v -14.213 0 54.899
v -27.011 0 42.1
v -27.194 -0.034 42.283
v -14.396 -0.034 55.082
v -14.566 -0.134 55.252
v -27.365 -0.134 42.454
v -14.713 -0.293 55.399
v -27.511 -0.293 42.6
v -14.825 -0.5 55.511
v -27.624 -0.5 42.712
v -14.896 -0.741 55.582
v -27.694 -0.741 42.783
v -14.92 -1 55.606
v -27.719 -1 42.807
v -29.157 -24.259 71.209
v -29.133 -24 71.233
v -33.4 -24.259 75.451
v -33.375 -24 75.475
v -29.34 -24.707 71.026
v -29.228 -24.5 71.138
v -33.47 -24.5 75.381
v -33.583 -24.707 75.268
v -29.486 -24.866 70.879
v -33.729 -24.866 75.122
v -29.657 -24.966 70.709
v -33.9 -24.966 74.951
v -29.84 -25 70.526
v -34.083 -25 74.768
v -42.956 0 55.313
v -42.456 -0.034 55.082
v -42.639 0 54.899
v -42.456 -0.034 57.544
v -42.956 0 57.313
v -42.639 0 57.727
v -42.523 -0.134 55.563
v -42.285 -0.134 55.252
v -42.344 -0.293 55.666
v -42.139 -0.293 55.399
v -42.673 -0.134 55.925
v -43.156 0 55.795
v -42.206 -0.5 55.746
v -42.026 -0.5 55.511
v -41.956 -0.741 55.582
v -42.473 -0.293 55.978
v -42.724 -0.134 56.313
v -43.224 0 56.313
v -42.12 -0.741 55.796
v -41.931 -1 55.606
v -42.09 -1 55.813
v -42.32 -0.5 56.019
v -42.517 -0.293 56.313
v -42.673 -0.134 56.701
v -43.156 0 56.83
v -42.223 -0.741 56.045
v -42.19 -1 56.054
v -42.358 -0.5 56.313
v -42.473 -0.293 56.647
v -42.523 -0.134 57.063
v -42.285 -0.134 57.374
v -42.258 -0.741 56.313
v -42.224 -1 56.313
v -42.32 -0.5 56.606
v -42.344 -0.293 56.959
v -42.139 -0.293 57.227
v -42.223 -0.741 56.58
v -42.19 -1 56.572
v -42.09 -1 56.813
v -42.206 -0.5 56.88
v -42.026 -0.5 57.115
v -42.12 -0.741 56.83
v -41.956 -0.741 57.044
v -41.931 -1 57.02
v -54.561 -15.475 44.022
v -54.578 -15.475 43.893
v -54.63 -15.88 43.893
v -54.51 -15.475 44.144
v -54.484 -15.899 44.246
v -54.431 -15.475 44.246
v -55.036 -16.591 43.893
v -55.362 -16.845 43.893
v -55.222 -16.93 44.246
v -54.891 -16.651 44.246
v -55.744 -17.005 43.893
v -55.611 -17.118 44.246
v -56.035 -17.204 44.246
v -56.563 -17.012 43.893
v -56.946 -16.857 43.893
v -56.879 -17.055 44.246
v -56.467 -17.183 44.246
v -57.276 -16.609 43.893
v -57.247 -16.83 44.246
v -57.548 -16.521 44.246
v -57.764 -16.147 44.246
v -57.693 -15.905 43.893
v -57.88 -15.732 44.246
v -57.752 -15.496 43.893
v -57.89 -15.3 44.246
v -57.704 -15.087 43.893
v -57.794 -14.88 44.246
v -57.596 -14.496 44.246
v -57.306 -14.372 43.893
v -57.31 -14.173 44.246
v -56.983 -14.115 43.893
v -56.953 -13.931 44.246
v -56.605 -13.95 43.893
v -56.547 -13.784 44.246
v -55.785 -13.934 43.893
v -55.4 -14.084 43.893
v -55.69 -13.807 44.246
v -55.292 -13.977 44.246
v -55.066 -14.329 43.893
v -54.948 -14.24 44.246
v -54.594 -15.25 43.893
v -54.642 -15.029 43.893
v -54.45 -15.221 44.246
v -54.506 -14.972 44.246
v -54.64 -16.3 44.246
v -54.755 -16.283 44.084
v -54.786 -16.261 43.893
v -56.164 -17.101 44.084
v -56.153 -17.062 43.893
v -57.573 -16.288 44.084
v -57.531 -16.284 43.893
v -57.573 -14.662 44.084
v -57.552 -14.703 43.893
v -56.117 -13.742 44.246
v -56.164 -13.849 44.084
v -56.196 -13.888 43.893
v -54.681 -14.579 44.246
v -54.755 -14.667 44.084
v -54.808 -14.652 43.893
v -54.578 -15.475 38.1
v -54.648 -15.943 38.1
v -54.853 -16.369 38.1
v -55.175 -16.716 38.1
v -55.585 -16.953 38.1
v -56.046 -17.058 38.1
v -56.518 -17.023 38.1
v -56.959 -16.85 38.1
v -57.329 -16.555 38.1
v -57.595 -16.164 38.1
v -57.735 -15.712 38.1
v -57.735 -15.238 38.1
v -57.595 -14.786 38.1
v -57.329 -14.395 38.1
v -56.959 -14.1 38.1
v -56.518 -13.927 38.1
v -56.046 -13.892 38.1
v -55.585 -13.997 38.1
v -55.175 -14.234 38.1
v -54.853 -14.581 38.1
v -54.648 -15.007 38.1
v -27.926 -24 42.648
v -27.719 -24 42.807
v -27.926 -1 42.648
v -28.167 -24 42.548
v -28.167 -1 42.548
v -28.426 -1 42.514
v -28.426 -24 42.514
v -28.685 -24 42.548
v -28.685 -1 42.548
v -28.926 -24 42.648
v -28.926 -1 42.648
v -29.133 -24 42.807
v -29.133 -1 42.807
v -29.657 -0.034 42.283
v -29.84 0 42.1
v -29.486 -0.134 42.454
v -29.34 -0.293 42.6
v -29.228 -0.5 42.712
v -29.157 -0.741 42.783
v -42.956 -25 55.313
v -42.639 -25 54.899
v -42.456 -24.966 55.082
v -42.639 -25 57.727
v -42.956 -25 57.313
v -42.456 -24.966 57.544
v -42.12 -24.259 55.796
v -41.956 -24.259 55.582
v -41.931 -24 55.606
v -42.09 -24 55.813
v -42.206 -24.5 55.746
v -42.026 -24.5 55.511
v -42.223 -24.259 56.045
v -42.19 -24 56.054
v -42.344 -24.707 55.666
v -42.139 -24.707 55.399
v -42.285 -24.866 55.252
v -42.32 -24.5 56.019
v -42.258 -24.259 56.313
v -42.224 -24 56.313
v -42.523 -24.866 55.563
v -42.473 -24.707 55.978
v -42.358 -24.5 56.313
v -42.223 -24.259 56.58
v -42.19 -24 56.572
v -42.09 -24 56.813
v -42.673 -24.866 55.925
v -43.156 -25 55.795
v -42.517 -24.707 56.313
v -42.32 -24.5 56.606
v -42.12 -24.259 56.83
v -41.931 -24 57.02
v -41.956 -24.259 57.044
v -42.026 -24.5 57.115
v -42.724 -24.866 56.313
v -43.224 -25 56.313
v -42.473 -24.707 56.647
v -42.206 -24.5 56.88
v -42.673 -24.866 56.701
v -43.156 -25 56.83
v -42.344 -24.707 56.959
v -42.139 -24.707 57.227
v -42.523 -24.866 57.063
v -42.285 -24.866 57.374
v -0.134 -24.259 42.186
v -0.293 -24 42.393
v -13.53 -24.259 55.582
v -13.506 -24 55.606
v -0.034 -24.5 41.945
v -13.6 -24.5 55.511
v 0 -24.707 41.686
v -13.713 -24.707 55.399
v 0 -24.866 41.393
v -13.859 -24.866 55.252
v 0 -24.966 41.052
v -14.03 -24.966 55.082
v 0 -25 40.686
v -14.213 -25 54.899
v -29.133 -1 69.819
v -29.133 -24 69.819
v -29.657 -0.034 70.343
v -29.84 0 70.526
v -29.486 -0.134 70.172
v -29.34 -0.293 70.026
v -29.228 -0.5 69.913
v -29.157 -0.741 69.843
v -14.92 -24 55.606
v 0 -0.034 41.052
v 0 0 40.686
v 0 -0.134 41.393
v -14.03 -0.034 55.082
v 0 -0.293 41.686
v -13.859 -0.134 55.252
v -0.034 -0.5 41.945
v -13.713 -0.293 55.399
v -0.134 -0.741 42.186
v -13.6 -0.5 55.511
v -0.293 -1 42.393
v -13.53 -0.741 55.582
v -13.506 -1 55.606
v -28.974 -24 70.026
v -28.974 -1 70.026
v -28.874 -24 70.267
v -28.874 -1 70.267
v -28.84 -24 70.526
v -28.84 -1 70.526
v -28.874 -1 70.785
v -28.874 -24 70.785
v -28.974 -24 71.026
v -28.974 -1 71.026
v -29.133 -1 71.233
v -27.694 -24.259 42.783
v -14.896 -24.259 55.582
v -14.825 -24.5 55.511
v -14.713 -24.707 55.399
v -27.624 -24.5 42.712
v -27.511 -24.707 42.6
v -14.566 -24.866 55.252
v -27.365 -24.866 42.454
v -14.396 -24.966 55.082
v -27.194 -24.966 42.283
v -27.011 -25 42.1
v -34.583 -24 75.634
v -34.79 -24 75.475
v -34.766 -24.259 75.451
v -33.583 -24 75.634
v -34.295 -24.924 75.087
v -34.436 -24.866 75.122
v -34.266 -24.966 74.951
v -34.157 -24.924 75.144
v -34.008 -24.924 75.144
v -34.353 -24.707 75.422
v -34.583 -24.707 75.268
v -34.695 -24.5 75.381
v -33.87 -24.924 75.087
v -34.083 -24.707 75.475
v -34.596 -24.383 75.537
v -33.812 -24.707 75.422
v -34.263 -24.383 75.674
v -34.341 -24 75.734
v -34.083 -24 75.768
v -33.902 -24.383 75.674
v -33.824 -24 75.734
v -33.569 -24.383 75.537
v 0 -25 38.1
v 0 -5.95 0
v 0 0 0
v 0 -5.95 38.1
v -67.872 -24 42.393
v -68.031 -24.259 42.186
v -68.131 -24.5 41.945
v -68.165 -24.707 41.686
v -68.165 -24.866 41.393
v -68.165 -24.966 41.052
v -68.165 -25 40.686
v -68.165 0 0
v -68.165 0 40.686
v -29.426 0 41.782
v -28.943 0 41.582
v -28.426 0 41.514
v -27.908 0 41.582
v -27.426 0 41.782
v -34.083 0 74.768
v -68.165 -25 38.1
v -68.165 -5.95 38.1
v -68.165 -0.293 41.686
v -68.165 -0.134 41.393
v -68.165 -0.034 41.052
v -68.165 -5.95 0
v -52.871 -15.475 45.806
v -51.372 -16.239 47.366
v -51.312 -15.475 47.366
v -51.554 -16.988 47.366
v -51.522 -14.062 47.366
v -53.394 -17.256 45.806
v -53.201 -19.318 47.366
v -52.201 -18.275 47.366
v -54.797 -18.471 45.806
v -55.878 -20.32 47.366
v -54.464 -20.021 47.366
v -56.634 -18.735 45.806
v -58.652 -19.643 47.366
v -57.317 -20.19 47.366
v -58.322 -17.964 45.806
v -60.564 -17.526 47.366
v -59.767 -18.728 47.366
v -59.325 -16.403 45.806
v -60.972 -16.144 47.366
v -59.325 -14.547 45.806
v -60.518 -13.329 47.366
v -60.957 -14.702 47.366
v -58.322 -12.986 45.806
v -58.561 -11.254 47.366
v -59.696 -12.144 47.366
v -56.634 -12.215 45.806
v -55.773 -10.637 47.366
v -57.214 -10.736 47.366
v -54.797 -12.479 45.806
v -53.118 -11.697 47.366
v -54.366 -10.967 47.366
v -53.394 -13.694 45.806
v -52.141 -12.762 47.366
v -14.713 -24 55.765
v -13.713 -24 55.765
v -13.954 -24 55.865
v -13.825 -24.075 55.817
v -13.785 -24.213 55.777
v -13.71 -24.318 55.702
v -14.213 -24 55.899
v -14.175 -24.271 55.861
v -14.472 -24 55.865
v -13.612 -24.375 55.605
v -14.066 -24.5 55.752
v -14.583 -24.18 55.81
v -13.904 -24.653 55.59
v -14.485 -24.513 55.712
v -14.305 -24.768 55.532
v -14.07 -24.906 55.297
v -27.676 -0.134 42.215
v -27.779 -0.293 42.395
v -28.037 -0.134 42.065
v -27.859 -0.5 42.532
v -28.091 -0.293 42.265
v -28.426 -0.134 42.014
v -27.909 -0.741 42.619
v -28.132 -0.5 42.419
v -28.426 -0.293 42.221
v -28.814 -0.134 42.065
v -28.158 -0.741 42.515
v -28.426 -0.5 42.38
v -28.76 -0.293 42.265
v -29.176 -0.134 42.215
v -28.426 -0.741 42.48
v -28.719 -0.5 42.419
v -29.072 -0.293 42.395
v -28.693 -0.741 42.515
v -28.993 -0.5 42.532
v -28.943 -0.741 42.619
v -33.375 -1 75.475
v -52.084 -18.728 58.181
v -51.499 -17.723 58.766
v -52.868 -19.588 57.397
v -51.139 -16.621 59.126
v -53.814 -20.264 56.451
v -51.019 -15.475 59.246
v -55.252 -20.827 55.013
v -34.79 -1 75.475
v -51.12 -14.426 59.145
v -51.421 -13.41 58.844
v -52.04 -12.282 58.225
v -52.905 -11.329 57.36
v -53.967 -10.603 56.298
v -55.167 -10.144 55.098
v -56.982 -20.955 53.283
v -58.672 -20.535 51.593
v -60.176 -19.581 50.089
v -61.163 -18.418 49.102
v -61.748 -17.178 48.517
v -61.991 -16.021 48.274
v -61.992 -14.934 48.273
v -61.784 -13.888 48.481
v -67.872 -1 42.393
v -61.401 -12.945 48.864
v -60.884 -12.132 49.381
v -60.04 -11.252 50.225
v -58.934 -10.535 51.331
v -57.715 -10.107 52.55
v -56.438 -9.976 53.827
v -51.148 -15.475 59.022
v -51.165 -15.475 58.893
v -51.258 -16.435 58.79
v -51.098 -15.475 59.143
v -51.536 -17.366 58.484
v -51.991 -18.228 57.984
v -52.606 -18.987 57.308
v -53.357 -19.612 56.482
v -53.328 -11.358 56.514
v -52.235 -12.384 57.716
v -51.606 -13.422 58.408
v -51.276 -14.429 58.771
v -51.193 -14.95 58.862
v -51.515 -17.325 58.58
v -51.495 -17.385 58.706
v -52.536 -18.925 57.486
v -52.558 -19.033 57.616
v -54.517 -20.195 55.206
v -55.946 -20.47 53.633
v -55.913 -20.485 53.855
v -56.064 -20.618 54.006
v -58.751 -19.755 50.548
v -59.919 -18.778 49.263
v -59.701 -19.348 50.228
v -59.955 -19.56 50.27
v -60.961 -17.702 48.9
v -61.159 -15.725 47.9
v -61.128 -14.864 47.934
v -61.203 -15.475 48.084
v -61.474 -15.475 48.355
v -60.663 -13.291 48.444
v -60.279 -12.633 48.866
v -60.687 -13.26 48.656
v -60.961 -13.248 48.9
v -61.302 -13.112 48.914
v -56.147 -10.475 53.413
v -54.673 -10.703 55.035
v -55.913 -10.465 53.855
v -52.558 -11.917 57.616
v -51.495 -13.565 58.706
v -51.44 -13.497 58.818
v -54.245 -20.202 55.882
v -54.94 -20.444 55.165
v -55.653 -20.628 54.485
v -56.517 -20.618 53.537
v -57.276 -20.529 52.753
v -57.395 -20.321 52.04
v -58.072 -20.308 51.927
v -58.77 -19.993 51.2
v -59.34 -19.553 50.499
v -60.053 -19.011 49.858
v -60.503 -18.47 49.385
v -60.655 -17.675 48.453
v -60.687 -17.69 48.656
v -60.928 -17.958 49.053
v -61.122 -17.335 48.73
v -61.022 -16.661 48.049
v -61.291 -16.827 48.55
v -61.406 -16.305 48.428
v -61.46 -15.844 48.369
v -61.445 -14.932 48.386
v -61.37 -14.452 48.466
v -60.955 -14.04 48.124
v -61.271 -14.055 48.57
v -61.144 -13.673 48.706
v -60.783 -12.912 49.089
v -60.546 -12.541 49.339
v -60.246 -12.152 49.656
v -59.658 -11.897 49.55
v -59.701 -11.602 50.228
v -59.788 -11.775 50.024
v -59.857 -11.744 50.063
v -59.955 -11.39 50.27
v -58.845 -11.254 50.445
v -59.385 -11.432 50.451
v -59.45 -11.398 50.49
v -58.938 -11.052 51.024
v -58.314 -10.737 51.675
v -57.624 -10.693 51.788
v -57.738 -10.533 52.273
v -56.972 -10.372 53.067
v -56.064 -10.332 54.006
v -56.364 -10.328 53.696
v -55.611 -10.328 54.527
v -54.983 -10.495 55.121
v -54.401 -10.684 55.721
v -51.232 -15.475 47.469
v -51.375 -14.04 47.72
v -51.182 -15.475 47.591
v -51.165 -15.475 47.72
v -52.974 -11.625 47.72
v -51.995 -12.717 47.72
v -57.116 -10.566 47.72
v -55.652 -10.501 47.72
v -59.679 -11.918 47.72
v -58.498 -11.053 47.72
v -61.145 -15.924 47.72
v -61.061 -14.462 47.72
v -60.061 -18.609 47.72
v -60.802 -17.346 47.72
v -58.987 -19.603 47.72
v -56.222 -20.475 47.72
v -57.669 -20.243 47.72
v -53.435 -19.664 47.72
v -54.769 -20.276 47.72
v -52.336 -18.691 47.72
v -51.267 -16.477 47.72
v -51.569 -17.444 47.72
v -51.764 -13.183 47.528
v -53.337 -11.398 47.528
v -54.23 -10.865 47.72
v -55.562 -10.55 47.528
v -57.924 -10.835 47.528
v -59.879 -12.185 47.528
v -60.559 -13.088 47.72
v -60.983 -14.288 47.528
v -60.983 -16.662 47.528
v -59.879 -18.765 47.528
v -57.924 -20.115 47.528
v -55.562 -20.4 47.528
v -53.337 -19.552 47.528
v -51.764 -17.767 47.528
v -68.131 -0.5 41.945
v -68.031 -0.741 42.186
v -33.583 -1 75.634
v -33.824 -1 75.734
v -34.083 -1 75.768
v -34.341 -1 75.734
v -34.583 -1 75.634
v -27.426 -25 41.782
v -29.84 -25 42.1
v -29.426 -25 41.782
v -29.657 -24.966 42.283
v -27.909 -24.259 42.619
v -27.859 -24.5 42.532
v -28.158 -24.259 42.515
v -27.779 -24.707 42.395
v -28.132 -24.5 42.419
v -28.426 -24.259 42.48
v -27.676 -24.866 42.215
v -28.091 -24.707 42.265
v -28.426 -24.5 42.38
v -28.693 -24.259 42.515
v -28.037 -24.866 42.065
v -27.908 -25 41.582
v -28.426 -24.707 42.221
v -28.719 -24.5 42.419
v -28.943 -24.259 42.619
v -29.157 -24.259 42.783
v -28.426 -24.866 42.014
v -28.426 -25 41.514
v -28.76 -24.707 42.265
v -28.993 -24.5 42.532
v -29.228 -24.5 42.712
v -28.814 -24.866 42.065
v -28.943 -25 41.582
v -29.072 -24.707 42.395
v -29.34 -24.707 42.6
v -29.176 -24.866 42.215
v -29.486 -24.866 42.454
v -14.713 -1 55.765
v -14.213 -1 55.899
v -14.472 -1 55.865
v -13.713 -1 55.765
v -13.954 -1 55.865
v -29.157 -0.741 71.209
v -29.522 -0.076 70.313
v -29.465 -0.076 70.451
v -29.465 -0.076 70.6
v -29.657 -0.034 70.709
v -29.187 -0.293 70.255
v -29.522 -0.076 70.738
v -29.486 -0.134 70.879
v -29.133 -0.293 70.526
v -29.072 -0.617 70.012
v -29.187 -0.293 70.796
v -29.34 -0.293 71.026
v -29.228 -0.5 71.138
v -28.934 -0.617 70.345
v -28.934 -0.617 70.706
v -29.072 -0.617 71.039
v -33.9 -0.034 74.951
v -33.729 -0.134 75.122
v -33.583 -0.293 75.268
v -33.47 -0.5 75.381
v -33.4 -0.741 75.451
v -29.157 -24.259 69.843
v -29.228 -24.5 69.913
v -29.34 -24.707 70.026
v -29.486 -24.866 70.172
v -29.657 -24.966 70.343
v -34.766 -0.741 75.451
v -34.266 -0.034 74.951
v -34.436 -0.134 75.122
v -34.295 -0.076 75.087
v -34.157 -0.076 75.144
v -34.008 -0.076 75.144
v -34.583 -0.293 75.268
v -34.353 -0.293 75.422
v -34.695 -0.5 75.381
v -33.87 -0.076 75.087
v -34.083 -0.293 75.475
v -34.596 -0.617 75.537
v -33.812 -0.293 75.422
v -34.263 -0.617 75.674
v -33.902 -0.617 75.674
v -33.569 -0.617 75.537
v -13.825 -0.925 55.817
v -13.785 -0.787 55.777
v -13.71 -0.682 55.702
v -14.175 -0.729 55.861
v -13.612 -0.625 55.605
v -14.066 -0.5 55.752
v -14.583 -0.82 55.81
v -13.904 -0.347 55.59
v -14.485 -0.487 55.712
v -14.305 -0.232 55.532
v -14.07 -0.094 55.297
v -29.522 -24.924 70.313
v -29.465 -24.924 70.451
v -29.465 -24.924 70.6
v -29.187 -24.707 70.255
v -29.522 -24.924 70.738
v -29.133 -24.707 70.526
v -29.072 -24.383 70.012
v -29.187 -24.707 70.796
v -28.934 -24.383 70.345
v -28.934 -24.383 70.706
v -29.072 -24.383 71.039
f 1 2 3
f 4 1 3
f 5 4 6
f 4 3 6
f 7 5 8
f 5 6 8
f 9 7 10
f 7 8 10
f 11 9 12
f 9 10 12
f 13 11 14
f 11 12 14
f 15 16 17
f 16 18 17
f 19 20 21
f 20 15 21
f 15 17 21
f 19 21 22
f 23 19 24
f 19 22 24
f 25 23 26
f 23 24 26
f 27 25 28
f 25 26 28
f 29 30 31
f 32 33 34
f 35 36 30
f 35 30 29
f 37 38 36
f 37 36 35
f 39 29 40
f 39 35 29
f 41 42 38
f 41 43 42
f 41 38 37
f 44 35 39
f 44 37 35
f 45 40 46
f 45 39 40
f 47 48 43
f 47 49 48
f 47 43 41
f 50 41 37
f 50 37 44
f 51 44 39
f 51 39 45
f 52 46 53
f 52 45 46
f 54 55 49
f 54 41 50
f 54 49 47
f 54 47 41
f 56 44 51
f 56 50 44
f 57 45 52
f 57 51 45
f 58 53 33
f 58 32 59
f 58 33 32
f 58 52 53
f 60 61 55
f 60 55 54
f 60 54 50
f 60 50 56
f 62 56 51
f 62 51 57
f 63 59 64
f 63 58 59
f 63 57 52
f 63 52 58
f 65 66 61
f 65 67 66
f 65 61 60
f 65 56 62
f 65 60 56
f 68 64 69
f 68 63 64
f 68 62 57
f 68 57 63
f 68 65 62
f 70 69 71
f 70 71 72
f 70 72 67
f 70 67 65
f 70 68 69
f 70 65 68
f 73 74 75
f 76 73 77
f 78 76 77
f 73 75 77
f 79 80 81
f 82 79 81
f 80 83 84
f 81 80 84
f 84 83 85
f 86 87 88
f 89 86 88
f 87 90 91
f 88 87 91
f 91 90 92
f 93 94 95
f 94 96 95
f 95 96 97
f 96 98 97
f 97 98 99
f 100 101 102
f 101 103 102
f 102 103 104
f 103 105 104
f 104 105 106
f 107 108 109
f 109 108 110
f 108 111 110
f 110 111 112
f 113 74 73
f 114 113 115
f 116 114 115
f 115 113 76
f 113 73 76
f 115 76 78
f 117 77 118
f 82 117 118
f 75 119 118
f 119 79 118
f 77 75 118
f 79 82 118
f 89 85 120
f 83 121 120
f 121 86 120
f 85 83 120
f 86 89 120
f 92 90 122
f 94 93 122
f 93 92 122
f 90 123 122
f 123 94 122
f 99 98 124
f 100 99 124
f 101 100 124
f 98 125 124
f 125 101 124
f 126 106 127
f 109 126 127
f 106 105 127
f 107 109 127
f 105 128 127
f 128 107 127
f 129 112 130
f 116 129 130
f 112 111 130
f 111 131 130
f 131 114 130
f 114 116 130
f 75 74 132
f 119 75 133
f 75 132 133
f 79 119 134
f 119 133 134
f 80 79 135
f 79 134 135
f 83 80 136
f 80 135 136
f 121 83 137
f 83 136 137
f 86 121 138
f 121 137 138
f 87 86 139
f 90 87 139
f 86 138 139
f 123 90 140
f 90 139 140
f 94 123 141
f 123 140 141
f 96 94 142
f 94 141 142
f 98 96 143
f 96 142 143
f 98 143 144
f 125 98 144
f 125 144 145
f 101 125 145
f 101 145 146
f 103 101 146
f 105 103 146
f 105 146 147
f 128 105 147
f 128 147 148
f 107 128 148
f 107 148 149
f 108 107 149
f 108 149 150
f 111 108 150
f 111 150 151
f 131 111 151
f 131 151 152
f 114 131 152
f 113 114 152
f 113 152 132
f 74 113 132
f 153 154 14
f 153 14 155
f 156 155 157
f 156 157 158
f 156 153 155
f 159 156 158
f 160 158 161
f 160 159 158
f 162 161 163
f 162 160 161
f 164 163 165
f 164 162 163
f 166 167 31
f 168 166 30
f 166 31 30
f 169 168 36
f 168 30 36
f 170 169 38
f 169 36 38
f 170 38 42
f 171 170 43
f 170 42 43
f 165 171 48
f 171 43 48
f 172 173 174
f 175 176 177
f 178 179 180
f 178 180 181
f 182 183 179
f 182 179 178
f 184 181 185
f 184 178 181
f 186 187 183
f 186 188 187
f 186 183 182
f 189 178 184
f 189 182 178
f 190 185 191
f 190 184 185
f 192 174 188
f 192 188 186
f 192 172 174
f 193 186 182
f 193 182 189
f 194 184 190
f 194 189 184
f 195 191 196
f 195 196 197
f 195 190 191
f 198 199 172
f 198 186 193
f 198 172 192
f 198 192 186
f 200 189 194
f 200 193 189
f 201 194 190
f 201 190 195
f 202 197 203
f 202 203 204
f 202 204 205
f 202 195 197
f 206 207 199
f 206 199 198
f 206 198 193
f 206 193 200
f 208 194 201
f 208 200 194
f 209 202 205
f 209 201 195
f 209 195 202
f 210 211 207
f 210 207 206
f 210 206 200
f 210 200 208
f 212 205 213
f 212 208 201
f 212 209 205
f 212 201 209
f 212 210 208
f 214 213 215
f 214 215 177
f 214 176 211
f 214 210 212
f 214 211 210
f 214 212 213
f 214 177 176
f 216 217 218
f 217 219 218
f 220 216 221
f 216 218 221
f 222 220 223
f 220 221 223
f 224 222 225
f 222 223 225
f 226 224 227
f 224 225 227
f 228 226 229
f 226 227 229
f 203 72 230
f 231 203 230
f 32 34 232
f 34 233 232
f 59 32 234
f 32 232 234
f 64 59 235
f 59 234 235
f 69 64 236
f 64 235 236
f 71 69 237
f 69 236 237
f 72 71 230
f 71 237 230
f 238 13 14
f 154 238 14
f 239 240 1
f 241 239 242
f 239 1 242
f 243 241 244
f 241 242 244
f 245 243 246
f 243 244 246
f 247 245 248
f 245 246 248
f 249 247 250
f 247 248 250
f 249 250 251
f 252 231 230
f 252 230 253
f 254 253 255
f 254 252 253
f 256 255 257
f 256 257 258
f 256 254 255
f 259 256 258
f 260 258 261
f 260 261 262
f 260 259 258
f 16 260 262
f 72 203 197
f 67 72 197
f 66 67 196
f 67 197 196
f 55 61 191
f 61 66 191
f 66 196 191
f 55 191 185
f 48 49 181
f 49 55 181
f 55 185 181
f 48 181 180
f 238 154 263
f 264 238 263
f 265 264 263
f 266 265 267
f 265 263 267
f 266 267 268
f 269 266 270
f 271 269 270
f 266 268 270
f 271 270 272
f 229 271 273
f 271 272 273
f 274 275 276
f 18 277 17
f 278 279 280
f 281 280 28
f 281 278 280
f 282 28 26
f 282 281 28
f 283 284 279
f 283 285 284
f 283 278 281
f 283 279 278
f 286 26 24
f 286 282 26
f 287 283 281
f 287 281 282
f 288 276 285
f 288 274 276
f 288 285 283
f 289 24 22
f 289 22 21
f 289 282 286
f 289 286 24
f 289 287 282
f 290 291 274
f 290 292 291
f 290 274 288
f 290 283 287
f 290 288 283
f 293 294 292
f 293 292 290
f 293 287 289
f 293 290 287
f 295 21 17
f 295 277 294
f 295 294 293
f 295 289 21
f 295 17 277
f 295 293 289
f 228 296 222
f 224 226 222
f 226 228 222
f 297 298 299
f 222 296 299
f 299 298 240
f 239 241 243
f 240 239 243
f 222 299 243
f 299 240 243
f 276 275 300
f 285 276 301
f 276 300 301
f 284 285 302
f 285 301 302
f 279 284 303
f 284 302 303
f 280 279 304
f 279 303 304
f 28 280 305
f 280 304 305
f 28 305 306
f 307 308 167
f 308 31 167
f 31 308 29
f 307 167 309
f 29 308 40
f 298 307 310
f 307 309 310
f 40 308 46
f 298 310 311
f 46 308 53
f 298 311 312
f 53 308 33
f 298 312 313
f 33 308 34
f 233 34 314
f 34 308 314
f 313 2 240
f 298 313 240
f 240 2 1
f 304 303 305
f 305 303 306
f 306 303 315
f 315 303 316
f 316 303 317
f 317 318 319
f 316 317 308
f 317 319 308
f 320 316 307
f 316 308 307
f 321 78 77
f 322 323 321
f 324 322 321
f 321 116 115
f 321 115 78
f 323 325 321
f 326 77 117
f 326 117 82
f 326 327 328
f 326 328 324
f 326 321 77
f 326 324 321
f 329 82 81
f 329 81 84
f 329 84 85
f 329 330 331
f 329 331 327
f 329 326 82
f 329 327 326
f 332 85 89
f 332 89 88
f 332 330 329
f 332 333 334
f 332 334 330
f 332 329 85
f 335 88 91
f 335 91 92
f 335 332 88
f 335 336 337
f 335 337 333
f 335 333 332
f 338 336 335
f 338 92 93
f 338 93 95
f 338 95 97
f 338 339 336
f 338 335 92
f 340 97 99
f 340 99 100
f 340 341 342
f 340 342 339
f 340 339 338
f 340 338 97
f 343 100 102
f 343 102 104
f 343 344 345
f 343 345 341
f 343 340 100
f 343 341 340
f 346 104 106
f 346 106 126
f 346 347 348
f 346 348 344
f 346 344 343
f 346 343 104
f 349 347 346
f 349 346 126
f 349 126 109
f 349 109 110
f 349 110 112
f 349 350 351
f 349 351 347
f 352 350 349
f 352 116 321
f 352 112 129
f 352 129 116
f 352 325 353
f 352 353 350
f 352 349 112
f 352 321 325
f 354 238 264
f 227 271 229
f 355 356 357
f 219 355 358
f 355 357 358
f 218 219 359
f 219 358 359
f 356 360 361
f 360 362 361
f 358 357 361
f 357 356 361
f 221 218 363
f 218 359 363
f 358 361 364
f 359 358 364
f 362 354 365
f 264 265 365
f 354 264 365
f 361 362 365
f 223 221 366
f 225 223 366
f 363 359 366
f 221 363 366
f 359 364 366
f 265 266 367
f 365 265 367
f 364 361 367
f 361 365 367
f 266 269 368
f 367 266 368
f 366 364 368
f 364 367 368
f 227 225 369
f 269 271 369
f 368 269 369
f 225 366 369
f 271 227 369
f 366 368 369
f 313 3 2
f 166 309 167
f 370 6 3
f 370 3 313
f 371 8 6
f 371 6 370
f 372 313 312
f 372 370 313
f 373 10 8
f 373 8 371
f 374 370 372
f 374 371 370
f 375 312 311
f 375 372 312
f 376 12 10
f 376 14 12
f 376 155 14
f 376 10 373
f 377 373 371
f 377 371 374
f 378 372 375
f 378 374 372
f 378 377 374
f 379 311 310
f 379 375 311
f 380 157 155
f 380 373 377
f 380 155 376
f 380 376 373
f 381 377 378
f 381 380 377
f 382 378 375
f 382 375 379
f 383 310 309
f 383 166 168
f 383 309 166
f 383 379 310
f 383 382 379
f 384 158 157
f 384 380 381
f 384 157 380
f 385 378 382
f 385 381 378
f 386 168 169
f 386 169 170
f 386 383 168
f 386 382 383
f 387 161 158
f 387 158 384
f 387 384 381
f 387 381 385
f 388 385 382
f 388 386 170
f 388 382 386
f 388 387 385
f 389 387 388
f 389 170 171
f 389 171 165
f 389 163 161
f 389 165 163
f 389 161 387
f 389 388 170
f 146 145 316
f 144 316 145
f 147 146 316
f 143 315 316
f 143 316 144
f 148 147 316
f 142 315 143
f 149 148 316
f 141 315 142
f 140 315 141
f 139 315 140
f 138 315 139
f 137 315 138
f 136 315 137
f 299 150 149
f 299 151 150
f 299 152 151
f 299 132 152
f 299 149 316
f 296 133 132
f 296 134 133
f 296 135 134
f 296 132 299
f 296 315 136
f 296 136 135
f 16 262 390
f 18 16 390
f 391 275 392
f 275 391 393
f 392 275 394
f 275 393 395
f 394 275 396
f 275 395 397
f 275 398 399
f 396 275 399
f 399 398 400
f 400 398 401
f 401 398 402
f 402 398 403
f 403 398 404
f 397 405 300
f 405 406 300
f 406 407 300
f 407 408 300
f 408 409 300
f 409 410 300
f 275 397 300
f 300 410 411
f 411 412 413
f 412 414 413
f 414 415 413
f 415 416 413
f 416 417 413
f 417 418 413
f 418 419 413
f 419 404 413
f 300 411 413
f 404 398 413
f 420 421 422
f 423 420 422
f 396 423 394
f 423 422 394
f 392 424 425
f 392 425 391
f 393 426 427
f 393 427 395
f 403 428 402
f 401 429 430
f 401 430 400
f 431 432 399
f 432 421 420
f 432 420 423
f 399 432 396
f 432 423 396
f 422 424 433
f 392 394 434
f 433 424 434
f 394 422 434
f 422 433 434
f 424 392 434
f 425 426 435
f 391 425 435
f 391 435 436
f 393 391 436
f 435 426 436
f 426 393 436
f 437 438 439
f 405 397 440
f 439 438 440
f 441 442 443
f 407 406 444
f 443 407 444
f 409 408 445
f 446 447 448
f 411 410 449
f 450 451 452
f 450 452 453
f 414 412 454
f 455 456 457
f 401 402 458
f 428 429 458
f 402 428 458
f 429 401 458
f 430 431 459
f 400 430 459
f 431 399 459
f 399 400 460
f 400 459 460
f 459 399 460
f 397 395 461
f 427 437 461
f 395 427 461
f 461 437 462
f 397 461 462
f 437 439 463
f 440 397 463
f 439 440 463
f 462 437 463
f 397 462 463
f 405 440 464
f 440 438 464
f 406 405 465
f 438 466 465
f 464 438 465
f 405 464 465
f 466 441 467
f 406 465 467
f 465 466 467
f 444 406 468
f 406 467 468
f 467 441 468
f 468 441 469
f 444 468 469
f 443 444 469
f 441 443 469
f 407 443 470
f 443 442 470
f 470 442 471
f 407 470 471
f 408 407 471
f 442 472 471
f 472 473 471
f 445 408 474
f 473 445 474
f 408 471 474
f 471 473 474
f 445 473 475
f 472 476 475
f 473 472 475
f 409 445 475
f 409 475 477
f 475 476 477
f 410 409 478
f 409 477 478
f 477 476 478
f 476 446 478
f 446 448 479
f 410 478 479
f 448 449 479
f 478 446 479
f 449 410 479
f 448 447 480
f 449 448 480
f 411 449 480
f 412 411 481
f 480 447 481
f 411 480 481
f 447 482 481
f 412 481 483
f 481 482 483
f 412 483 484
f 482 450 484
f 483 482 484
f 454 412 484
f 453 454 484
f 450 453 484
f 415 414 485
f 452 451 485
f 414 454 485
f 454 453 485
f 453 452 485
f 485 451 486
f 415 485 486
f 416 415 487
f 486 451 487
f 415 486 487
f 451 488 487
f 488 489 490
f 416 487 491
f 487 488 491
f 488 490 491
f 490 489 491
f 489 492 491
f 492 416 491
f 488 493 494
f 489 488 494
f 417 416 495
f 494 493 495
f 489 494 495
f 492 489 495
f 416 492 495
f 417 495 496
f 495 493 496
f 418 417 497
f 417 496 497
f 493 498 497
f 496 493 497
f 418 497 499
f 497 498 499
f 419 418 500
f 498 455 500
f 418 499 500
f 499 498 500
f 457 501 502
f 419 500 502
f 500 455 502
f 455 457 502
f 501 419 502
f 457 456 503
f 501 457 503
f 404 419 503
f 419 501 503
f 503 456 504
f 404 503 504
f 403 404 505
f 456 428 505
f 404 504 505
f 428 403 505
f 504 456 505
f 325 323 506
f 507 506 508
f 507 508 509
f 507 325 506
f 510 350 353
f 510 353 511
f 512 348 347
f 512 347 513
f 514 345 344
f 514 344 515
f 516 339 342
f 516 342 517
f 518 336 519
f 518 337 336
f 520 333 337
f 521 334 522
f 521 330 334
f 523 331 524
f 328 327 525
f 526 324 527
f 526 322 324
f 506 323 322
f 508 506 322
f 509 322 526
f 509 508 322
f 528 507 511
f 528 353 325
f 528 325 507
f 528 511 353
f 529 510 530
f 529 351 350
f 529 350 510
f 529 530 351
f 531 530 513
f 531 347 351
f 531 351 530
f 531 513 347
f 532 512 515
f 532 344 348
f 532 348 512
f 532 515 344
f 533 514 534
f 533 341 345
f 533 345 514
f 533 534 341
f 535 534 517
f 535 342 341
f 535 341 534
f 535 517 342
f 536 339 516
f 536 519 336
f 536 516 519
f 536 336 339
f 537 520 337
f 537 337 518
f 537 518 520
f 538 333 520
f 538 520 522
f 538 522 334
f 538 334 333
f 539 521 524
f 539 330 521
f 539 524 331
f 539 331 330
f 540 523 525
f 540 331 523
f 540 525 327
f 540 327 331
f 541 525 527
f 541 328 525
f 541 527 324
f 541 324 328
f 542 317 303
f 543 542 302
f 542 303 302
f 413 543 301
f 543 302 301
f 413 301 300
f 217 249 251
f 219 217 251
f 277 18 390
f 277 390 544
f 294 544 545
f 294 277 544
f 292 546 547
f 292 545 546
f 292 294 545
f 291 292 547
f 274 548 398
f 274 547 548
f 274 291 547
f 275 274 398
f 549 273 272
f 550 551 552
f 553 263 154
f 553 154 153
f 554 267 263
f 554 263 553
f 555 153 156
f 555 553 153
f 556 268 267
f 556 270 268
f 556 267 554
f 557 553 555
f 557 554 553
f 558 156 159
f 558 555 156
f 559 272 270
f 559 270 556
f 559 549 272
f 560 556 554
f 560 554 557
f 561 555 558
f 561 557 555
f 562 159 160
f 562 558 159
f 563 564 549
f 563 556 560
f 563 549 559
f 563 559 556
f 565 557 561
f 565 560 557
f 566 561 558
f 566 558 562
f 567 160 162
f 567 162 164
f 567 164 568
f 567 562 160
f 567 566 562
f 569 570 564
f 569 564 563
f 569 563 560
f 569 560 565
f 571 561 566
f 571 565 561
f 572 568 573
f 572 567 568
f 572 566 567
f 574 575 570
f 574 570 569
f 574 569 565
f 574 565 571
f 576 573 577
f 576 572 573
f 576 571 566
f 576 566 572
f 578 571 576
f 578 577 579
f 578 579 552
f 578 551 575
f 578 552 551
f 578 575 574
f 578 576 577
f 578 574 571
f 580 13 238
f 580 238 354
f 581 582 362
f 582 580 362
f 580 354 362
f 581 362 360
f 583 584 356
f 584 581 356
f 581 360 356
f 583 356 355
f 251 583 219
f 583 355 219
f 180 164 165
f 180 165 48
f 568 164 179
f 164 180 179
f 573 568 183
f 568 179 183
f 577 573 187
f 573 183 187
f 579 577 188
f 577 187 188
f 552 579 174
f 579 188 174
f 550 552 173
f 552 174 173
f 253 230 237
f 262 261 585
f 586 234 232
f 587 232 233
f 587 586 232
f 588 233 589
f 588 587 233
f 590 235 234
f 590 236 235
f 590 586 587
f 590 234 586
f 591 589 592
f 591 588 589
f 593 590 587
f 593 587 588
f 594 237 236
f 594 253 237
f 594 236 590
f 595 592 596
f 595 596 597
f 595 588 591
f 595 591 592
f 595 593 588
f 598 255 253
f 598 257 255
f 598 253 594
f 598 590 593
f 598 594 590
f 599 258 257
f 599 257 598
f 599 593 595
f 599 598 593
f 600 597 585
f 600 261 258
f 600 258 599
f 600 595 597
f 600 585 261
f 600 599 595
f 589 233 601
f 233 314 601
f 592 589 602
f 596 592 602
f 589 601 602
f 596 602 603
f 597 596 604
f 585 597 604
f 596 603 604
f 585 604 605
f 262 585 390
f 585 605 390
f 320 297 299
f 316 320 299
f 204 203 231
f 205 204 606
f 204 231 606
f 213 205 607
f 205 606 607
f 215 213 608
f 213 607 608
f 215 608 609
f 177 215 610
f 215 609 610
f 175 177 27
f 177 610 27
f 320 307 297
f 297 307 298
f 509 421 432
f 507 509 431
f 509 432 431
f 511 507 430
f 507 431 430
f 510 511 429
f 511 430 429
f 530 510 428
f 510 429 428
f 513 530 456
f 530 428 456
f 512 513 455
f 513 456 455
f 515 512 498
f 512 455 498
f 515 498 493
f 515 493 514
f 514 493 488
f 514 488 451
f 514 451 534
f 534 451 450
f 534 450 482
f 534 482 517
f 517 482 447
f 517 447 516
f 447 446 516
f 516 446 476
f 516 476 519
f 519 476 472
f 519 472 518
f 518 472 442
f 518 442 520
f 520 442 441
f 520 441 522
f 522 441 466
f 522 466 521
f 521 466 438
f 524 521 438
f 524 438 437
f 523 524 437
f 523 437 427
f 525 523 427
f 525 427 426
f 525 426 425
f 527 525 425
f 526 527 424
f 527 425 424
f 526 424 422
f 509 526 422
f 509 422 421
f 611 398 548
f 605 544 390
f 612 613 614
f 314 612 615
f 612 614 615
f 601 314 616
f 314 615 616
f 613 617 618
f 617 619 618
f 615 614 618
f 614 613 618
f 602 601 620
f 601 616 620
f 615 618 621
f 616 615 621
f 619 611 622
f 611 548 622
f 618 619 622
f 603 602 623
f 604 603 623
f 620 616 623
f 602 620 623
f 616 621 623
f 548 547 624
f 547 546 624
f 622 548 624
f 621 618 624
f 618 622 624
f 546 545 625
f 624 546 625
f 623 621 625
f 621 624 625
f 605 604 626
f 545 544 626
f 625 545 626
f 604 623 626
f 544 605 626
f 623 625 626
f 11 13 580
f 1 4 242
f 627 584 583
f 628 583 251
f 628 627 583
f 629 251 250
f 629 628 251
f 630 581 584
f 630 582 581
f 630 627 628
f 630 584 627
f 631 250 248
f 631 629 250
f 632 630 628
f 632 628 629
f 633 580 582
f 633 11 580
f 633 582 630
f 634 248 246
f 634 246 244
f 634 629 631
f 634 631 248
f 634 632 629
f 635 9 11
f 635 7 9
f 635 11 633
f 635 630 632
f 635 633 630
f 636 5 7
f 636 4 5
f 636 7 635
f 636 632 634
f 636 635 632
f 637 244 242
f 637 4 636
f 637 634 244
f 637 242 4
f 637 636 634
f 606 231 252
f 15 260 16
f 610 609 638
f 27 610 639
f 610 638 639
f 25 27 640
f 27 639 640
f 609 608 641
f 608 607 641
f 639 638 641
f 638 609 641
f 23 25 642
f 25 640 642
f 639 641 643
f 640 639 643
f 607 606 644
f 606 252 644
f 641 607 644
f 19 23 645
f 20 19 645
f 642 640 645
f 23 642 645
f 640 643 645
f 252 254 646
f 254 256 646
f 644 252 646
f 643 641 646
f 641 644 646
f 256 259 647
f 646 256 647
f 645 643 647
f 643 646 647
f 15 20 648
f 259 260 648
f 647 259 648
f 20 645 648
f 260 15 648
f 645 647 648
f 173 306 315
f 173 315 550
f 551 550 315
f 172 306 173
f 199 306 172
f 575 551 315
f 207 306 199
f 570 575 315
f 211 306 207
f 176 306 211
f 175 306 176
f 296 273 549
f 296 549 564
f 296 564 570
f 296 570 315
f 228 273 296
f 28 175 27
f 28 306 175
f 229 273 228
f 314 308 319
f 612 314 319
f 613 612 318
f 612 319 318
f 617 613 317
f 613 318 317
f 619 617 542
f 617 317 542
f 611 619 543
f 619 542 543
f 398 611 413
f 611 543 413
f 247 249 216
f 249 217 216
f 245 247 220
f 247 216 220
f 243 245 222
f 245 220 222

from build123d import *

# Parameters (mm, degrees)
F1_DEPTH    = 25
F2_W        = 19.05
F2_H        = 38.1
F3_DEPTH    = 68.1660937064
F4_F1_R     = 1
F4_F2_R     = 1
F5_R        = 5
F5_R_2      = 1.5875
F6_DEPTH    = 37.6693332908
F7_DEPTH    = 10
F8_S5_R     = 5
F8_T6_DEPTH = 10
F9_R        = 0.5


# Not quite as in the source:
# - a fillet or chamfer that OpenCascade refuses, or shapes differently, is made with other operations: its cross-section is extruded or revolved along the edge and cut away or added


with BuildPart() as f1:
    # F0 (on Front) → F1 (new body)
    with BuildSketch(Plane.XZ):
        Polygon((-34.0825468532, 76.1825468532), (-68.1650937064, 42.1), (-68.1650937064, 0), (0, 0), (0, 42.1), (-14.2128463018, 56.3128463018), (-28.4256926037, 42.1), (-42.6385389055, 56.3128463018), (-28.4256926037, 70.5256926037), align=None)
    extrude(amount=F1_DEPTH)

    # F2 (on face) → F3 (cut, through all)
    with BuildSketch(Plane.YZ):
        with Locations((-15.475, 19.05)):
            Rectangle(F2_W, F2_H)
    extrude(amount=-F3_DEPTH, mode=Mode.SUBTRACT)

    # F4: fillet of radius 1 on 17 edges, made by hand

    # F4_f1
    f4_f1_edges = [f1.edges().sort_by_distance(p)[0] for p in [
        (-42.6385389055, -12.5, 56.3128463018),
        (-28.4256926037, -12.5, 42.1),
    ]]
    fillet(f4_f1_edges, radius=F4_F1_R)

    # F4_f2
    f4_f2_edges = [f1.edges().sort_by_distance(p)[0] for p in [
        (-28.4256926037, -12.5, 70.5256926037),
        (-35.178562364, 0, 63.7728228434),
        (-35.178562364, -25, 63.7728228434),
        (-14.2128463018, -12.5, 56.3128463018),
        (-20.9657160622, 0, 49.5599765415),
        (-20.9657160622, -25, 49.5599765415),
        (-34.0825468532, -12.5, 76.1825468532),
        (-68.1650937064, -12.5, 42.1),
        (-51.1238202798, 0, 59.1412734266),
        (-51.1238202798, -25, 59.1412734266),
        (0, -12.5, 42.1),
        (-7.1064231509, 0, 49.2064231509),
        (-7.1064231509, -25, 49.2064231509),
        (-31.2541197284, 0, 73.3541197284),
        (-31.2541197284, -25, 73.3541197284),
        (-28.4256926037, -25, 42.5142135624),
        (-28.4256926037, 0, 42.5142135624),
        (-42.2243253432, -25, 56.3128463018),
        (-42.2243253432, 0, 56.3128463018),
    ]]
    fillet(f4_f2_edges, radius=F4_F2_R)

    # F5 (on face) → F6 (cut, through all)
    with BuildSketch(Plane(origin=(0, 0, 38.1), x_dir=(1, 0, 0), z_dir=(0, 0, -1))):
        with Locations((-56.1650937064, 15.475)):
            Circle(F5_R)
        with Locations((-56.1650937064, 15.475)):
            Circle(F5_R_2, mode=Mode.SUBTRACT)
        with Locations((-56.1650937064, 15.475)):
            Circle(F5_R_2)
    extrude(amount=-F6_DEPTH, mode=Mode.SUBTRACT)

    # F5 (on face) → F7 (join)
    with BuildSketch(Plane(origin=(0, 0, 38.1), x_dir=(1, 0, 0), z_dir=(0, 0, -1))):
        with Locations((-56.1650937064, 15.475)):
            Circle(F5_R)
        with Locations((-56.1650937064, 15.475)):
            Circle(F5_R_2, mode=Mode.SUBTRACT)
    extrude(amount=-F7_DEPTH)

    # F8: chamfer of 4 on 1 edges, made by hand


with BuildPart() as f8_tool2:
    # F8_s3 → F8_t4 (revolve)
    with BuildSketch(Plane.XZ.offset(15.475)):
        Polygon((-54.5775937064, 44.1), (-50.5775937064, 48.1), (-54.5775937064, 48.1), align=None)
    revolve(axis=Axis((-56.1650937064, -15.475, 48.1), (0, 0, -1)))

    # F8_s5 → F8_t6 (intersect, symmetric)
    with BuildSketch(Plane.XY.offset(46.1)):
        with Locations((-56.1650937064, -15.475)):
            Circle(F8_S5_R)
    extrude(amount=F8_T6_DEPTH, both=True, mode=Mode.INTERSECT)


with BuildPart() as f1_1:
    add(f1.part)

    # F8_t1: cut F8_tool2
    add(f8_tool2.part, mode=Mode.SUBTRACT)

    # F9
    f9_edges = [f1_1.edges().sort_by_distance(p)[0] for p in [
        (-61.165093, -15.47181, 49.100001),
        (-51.165094, -15.475, 53.30625),
        (-61.165094, -15.475, 47.5125),
        (-57.752594, -15.475, 44.1),
    ]]
    fillet(f9_edges, radius=F9_R)


solid = f1_1.part
